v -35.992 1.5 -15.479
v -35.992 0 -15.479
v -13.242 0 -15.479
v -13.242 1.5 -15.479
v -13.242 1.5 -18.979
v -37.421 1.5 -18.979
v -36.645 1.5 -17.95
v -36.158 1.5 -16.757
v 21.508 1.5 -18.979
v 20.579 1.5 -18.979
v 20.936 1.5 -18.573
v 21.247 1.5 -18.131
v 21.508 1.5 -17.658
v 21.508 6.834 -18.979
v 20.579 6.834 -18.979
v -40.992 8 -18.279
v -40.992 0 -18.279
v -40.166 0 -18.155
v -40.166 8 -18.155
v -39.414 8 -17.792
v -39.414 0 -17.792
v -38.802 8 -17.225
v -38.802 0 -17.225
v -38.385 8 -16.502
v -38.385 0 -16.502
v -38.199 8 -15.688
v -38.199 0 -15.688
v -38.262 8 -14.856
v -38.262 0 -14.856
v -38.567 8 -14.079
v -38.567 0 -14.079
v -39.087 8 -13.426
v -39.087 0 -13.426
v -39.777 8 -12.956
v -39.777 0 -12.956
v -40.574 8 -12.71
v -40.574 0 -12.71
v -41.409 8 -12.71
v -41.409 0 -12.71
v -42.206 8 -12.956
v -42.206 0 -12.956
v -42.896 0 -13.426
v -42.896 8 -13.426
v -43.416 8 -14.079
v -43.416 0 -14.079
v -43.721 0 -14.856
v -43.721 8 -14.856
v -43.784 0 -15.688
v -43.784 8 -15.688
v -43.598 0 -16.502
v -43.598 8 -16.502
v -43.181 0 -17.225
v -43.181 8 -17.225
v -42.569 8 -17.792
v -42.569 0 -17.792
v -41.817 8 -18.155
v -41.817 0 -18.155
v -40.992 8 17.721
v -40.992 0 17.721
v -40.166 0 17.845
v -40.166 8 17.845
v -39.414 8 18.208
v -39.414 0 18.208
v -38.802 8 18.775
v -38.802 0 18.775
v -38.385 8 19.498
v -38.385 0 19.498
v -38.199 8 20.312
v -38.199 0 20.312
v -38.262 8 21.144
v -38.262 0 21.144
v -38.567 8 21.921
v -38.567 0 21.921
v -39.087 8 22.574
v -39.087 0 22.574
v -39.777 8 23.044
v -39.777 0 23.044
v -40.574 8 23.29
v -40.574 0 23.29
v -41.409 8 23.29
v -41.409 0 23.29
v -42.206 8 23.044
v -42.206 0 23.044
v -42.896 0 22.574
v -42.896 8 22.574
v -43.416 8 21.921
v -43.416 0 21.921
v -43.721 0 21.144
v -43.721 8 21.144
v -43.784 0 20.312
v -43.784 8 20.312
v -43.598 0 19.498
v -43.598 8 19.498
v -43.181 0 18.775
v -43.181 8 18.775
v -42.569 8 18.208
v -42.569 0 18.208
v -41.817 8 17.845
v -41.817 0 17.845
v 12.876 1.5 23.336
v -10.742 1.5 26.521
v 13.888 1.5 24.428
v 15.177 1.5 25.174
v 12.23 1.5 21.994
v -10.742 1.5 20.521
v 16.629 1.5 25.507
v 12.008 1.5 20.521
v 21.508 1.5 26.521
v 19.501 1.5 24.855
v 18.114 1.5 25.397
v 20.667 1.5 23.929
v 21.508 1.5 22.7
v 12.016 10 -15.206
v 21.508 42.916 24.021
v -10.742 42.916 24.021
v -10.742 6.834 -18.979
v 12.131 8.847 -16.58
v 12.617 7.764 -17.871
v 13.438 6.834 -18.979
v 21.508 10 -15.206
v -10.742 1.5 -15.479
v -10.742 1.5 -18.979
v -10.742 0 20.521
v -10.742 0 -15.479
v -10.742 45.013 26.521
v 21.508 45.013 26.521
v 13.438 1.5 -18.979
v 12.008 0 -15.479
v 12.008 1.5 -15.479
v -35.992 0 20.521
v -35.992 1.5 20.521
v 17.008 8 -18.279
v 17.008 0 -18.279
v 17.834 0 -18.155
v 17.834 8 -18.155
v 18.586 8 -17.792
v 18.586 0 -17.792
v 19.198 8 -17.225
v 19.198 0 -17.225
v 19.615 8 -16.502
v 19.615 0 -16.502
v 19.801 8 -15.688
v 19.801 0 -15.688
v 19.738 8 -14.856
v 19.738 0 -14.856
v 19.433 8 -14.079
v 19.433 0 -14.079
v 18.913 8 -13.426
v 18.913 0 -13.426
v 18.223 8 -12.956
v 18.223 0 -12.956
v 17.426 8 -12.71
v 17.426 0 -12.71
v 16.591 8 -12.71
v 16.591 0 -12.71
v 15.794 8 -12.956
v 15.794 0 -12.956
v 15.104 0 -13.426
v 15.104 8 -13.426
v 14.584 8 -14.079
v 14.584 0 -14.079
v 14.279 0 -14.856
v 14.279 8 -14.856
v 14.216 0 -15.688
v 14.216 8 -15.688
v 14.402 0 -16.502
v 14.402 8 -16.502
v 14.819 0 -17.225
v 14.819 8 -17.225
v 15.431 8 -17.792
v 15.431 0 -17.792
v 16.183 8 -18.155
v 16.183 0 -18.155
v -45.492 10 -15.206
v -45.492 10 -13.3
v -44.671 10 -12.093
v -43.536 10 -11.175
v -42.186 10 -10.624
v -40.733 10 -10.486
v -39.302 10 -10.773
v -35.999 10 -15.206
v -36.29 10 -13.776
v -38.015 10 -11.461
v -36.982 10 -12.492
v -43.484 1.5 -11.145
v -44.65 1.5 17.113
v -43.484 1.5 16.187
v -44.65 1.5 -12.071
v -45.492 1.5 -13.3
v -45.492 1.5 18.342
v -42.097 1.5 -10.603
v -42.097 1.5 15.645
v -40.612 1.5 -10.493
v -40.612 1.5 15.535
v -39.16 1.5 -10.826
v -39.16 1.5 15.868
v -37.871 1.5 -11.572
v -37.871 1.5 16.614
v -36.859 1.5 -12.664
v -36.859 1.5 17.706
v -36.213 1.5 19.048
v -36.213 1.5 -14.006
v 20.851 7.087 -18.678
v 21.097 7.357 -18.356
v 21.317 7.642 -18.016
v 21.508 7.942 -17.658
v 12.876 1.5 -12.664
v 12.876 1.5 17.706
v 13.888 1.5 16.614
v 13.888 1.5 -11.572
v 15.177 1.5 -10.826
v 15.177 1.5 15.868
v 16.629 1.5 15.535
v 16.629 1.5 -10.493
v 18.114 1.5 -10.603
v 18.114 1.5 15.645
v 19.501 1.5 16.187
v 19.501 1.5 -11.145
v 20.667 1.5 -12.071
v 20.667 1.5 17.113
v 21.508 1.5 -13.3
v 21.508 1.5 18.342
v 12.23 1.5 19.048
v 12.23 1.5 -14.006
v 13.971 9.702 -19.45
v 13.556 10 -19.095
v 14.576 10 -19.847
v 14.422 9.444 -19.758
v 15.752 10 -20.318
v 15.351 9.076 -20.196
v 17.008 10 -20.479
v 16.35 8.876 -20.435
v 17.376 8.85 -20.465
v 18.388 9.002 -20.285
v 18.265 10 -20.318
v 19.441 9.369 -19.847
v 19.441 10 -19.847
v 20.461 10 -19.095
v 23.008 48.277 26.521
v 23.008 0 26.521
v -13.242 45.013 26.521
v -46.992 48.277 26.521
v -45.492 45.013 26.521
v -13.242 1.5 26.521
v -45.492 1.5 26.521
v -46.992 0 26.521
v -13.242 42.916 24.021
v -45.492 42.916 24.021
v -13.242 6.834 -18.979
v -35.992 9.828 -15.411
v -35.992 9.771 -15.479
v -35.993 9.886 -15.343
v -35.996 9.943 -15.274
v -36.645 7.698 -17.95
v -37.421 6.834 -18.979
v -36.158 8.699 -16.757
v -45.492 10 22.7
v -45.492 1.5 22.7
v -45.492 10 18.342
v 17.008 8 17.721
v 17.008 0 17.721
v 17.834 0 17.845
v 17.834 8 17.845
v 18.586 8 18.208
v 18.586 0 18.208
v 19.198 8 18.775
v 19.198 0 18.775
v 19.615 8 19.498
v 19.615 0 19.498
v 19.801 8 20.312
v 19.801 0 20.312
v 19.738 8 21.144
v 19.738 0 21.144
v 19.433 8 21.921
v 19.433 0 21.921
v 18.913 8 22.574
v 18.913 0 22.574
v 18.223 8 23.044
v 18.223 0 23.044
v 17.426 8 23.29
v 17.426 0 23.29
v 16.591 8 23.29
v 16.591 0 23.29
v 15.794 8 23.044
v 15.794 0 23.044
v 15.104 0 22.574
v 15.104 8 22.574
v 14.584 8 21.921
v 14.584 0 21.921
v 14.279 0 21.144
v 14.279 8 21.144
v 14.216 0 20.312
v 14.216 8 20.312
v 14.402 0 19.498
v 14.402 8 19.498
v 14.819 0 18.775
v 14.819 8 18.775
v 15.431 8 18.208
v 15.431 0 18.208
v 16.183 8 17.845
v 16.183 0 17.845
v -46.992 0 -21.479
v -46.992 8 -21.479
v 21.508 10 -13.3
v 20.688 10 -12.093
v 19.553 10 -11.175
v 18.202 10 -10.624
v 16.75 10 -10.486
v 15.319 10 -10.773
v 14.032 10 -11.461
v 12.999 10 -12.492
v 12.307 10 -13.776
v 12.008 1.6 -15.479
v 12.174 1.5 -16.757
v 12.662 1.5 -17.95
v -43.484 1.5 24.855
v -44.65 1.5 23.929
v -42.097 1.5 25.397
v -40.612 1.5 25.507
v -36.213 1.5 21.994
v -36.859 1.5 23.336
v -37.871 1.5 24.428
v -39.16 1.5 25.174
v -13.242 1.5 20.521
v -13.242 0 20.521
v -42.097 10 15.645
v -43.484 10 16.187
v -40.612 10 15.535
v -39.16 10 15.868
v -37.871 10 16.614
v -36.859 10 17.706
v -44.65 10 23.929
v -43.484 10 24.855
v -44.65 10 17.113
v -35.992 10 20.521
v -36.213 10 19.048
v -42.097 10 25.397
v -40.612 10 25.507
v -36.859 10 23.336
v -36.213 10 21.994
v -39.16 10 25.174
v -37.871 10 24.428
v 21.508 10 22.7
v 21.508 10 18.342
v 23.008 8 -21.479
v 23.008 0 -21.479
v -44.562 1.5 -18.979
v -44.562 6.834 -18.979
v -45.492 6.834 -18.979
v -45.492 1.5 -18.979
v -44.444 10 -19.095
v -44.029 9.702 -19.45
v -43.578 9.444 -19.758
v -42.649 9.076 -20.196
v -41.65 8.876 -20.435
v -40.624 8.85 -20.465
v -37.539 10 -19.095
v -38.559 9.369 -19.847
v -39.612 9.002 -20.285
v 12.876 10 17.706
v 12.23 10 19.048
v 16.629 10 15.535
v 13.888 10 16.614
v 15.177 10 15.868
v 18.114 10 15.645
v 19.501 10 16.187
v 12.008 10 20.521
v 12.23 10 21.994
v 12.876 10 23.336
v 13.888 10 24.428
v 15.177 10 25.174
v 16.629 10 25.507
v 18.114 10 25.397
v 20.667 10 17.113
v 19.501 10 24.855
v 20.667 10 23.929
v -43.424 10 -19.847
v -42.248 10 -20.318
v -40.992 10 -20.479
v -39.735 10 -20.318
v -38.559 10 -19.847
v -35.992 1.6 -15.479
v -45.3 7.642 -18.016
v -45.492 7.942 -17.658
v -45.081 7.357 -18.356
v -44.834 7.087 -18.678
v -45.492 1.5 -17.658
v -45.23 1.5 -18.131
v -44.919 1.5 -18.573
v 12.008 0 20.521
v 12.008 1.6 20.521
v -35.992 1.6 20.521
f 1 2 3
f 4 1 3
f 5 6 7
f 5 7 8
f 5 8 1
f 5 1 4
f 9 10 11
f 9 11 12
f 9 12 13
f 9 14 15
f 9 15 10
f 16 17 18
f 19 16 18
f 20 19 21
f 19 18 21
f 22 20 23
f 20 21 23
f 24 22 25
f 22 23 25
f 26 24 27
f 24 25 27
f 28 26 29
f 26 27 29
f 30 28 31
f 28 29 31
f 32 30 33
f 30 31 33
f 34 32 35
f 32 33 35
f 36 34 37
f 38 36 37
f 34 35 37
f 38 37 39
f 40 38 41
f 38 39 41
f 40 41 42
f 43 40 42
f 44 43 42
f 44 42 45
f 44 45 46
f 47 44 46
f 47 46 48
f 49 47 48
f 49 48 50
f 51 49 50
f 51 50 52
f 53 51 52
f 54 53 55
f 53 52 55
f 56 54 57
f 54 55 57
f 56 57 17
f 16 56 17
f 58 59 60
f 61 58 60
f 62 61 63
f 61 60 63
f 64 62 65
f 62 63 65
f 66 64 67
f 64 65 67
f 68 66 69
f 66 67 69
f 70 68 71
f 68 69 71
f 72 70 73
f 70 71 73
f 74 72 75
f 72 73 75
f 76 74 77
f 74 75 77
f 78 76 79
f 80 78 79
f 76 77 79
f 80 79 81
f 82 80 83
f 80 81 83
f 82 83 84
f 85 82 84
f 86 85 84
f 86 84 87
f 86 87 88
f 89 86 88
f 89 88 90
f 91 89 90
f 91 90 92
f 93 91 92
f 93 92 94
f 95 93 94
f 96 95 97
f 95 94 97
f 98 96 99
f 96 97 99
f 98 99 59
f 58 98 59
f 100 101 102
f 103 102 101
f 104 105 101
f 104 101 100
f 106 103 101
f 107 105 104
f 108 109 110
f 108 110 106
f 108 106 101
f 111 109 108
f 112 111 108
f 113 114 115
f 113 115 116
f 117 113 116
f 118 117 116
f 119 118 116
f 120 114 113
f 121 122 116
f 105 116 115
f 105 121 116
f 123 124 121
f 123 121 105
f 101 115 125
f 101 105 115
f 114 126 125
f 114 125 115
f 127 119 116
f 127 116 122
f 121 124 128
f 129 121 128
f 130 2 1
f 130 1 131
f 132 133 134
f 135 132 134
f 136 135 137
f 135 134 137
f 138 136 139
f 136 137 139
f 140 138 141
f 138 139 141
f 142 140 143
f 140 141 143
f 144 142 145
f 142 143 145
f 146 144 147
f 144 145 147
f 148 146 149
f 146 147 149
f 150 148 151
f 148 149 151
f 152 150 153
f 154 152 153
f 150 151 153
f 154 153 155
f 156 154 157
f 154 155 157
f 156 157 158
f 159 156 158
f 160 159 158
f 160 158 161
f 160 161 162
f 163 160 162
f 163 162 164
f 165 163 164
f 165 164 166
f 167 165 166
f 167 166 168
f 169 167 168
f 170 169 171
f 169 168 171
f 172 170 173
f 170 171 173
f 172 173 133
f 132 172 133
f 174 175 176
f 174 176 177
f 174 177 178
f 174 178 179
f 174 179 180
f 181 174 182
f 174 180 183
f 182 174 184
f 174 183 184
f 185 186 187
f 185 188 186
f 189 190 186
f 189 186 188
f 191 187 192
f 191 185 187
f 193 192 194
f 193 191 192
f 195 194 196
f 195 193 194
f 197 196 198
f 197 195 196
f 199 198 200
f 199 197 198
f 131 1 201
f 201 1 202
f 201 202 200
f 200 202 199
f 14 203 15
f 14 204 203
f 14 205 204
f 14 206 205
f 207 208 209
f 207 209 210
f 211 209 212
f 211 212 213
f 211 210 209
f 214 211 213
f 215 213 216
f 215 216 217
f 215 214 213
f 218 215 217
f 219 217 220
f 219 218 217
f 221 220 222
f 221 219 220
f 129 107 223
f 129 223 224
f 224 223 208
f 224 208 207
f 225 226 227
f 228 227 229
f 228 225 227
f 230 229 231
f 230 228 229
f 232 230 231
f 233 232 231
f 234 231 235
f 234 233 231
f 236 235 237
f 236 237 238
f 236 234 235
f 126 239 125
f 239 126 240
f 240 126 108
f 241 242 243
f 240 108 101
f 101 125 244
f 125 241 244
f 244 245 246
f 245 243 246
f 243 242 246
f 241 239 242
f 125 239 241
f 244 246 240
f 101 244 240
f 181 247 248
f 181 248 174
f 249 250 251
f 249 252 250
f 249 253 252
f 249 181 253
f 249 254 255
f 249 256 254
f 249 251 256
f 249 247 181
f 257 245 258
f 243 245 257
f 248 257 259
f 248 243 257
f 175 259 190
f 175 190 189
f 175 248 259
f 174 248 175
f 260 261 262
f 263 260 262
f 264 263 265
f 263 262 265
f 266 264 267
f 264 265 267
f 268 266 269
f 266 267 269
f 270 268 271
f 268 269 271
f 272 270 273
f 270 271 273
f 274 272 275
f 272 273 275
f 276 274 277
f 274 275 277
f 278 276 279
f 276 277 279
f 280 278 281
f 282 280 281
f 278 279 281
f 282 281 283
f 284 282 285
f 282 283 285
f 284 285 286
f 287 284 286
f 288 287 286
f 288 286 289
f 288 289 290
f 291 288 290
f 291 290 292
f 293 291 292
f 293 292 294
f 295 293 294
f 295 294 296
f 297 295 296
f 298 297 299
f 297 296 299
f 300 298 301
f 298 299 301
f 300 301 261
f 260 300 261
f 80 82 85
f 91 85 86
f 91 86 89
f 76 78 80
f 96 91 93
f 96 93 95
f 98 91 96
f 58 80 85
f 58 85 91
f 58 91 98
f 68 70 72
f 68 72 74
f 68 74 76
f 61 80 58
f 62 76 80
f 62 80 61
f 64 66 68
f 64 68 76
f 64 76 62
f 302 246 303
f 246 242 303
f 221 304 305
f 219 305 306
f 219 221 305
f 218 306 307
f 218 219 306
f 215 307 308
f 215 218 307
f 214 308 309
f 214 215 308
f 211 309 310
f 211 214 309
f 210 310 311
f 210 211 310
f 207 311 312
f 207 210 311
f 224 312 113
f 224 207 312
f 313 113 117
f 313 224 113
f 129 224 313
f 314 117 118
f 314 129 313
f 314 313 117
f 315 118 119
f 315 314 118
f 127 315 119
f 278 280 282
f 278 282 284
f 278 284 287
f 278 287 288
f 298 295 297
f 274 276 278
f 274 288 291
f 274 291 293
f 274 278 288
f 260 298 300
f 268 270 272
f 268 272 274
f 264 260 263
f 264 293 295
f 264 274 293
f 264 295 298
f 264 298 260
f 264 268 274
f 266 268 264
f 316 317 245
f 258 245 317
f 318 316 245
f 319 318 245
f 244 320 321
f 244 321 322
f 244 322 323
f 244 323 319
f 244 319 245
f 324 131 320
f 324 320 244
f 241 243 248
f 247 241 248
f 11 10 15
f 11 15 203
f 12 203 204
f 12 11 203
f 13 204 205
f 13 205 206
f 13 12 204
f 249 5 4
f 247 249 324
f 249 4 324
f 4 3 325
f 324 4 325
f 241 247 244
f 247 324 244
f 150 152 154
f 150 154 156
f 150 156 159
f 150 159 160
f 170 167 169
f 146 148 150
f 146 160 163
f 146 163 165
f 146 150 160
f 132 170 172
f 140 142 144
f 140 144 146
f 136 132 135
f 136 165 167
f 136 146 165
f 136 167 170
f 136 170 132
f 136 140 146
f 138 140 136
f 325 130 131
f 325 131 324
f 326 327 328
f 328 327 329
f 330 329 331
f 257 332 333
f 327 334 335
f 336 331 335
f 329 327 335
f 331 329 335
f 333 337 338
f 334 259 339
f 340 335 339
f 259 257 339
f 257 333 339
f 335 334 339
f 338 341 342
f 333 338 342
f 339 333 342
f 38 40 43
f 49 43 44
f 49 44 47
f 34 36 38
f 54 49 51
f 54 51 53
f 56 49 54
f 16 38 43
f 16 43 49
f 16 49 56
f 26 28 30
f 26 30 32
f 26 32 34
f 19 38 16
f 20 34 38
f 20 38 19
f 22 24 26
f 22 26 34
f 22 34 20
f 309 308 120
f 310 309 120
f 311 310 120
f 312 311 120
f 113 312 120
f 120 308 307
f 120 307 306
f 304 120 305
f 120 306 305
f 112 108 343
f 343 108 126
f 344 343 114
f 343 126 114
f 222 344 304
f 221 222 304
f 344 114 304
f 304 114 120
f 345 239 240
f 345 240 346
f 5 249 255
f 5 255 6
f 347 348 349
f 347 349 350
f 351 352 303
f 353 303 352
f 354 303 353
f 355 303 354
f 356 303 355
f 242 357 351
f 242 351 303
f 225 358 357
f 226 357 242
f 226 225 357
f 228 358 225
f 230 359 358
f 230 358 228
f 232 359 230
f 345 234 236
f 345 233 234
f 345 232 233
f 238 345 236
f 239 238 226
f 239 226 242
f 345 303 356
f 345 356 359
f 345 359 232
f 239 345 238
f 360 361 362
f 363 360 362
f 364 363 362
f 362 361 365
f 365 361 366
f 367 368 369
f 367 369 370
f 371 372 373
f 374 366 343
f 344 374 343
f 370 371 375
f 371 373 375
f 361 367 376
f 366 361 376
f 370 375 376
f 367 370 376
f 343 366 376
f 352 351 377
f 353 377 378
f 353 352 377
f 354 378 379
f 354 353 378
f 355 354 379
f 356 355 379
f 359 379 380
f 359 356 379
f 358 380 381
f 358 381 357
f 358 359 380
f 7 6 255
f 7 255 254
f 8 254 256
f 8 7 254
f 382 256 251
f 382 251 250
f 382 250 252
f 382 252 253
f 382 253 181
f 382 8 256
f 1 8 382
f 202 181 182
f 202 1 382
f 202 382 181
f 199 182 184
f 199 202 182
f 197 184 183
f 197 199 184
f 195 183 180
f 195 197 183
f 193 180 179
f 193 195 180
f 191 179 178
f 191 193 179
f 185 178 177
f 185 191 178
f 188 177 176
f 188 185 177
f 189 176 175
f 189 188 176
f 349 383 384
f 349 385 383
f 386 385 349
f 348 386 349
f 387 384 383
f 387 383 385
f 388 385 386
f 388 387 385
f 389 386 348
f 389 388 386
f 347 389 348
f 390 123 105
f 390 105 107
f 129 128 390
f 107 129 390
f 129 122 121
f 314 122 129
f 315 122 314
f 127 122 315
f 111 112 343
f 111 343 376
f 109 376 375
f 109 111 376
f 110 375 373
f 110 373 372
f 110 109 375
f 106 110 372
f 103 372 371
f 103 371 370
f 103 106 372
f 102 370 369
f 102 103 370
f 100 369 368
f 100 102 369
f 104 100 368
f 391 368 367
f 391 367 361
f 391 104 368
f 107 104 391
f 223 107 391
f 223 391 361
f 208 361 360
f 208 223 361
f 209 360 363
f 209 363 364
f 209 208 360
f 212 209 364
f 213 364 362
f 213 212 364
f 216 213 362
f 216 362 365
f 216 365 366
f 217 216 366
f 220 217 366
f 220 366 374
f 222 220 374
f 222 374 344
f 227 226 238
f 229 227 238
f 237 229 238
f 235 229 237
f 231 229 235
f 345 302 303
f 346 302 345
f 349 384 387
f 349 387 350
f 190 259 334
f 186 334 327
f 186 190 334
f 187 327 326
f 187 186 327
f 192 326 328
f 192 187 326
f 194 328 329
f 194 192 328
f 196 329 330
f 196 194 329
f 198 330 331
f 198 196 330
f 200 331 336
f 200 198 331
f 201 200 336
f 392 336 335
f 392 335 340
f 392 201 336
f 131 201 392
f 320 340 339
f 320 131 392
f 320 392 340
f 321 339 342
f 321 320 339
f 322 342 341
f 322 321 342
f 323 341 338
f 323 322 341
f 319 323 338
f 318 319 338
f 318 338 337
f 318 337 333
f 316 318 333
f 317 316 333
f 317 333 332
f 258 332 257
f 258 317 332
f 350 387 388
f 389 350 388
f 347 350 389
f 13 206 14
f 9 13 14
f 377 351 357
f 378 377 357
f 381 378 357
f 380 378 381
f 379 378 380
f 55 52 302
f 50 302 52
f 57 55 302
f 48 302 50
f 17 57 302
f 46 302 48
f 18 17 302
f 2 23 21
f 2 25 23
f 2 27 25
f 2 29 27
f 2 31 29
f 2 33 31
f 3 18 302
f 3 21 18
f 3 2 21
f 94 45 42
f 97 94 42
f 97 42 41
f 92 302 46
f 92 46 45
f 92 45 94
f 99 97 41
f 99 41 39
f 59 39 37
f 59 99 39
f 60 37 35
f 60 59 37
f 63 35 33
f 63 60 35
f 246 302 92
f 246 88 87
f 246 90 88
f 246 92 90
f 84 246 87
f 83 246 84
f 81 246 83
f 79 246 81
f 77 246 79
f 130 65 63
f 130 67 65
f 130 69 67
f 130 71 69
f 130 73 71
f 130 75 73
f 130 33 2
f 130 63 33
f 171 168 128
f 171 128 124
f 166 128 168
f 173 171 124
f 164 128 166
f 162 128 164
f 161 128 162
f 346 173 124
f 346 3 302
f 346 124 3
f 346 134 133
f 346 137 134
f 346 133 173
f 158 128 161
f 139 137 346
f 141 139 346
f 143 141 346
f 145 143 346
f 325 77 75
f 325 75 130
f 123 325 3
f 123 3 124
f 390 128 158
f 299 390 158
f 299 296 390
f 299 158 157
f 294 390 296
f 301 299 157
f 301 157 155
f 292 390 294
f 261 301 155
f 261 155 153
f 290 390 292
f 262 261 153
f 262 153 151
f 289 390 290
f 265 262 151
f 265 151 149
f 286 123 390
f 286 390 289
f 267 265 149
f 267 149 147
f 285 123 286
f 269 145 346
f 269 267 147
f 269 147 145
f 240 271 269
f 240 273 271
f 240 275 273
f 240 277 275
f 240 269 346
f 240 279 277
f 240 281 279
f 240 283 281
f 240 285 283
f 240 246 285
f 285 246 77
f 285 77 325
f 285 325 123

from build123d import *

# Parameters (mm, degrees)
SKETCH1_W            = 70
SKETCH1_H            = 48
BOSS_EXTRUDE1_DEPTH  = 1.5
BOSS_EXTRUDE6_DEPTH  = 70
BOSS_EXTRUDE7_DEPTH  = 1.5
BOSS_EXTRUDE8_DEPTH  = 1.5
SKETCH9_R            = 5
BOSS_EXTRUDE9_DEPTH  = 10
SKETCH10_R           = 2.8
CUT_EXTRUDE1_DEPTH   = 8
SKETCH11_W           = 48
SKETCH11_H           = 36
CUT_EXTRUDE2_DEPTH   = 1.6
BOSS_EXTRUDE10_REACH = 74.403
SKETCH12_W           = 2.5
SKETCH12_H           = 48


with BuildPart() as part:
    # Sketch1 → Boss-Extrude1 (new body)
    with BuildSketch(Plane(origin=(0, 0, 0), x_dir=(1, 0, 0), z_dir=(0, 1, 0))):
        with Locations((-11.991596639, -2.521008403)):
            Rectangle(SKETCH1_W, SKETCH1_H)
    extrude(amount=BOSS_EXTRUDE1_DEPTH)

    # Sketch6 → Boss-Extrude6 (add)
    with BuildSketch(Plane(origin=(23.008403361, 0, 0), x_dir=(0, 0, -1), z_dir=(1, 0, 0))):
        Polygon((18.978991597, 1.5), (21.478991597, 1.5), (21.478991597, 8), (-26.521008403, 48.276782297), (-26.521008403, 45.013264073), (-24.021008403, 42.915514995), (18.978991597, 6.834230855), align=None)
    extrude(amount=-BOSS_EXTRUDE6_DEPTH)

    # Sketch7 → Boss-Extrude7 (add)
    with BuildSketch(Plane(origin=(23.008403361, 0, 0), x_dir=(0, 0, -1), z_dir=(1, 0, 0))):
        Polygon((-26.521008403, 1.5), (18.978991597, 1.5), (18.978991597, 6.834230855), (-26.521008403, 45.013264073), align=None)
    extrude(amount=-BOSS_EXTRUDE7_DEPTH)

    # Sketch8 → Boss-Extrude8 (add)
    with BuildSketch(Plane.ZY.offset(46.991596639)):
        Polygon((-18.978991597, 6.834230855), (26.521008403, 45.013264073), (26.521008403, 1.5), (-18.978991597, 1.5), align=None)
    extrude(amount=-BOSS_EXTRUDE8_DEPTH)

    # Sketch9 → Boss-Extrude9 (add)
    with BuildSketch(Plane.XZ):
        with Locations((17.008403361, -15.478991597)):
            Circle(SKETCH9_R)
        with Locations((-40.991596639, -15.478991597)):
            Circle(SKETCH9_R)
        with Locations((-40.991596639, 20.521008403)):
            Circle(SKETCH9_R)
        with Locations((17.008403361, 20.521008403)):
            Circle(SKETCH9_R)
    extrude(amount=-BOSS_EXTRUDE9_DEPTH)

    # Sketch10 → Cut-Extrude1 (cut)
    with BuildSketch(Plane.XZ):
        with Locations(Location((17.008403361, -15.478991597, 0), (0, 0, 270))):
            Circle(SKETCH10_R)
        with Locations(Location((-40.991596639, -15.478991597, 0), (0, 0, 270))):
            Circle(SKETCH10_R)
        with Locations(Location((-40.991596639, 20.521008403, 0), (0, 0, 270))):
            Circle(SKETCH10_R)
        with Locations(Location((17.008403361, 20.521008403, 0), (0, 0, 270))):
            Circle(SKETCH10_R)
    extrude(amount=-CUT_EXTRUDE1_DEPTH, mode=Mode.SUBTRACT)

    # Sketch11 → Cut-Extrude2 (cut)
    with BuildSketch(Plane.XZ):
        with Locations((-11.991596639, 2.521008403)):
            Rectangle(SKETCH11_W, SKETCH11_H)
    extrude(amount=-CUT_EXTRUDE2_DEPTH, mode=Mode.SUBTRACT)

    # Boss-Extrude10: up to this plane
    boss_extrude10_end = Plane(origin=(-46.991596639, 13.355820328, -11.206863912), z_dir=(0, 0.7660444431189827, -0.6427876096865339))
    # Sketch12 → Boss-Extrude10 (add, up to the surface)
    with BuildSketch(Plane.XZ, mode=Mode.PRIVATE) as boss_extrude10_sk1:
        with Locations((-11.991596639, 2.521008403)):
            Rectangle(SKETCH12_W, SKETCH12_H)
    boss_extrude10_tool1 = split(extrude(boss_extrude10_sk1.sketch, amount=-BOSS_EXTRUDE10_REACH, mode=Mode.PRIVATE), bisect_by=boss_extrude10_end, keep=Keep.BOTH, mode=Mode.PRIVATE)
    add(boss_extrude10_tool1.solids().sort_by_distance((-11.991597, 0, 2.521008))[0])


solid = part.part
